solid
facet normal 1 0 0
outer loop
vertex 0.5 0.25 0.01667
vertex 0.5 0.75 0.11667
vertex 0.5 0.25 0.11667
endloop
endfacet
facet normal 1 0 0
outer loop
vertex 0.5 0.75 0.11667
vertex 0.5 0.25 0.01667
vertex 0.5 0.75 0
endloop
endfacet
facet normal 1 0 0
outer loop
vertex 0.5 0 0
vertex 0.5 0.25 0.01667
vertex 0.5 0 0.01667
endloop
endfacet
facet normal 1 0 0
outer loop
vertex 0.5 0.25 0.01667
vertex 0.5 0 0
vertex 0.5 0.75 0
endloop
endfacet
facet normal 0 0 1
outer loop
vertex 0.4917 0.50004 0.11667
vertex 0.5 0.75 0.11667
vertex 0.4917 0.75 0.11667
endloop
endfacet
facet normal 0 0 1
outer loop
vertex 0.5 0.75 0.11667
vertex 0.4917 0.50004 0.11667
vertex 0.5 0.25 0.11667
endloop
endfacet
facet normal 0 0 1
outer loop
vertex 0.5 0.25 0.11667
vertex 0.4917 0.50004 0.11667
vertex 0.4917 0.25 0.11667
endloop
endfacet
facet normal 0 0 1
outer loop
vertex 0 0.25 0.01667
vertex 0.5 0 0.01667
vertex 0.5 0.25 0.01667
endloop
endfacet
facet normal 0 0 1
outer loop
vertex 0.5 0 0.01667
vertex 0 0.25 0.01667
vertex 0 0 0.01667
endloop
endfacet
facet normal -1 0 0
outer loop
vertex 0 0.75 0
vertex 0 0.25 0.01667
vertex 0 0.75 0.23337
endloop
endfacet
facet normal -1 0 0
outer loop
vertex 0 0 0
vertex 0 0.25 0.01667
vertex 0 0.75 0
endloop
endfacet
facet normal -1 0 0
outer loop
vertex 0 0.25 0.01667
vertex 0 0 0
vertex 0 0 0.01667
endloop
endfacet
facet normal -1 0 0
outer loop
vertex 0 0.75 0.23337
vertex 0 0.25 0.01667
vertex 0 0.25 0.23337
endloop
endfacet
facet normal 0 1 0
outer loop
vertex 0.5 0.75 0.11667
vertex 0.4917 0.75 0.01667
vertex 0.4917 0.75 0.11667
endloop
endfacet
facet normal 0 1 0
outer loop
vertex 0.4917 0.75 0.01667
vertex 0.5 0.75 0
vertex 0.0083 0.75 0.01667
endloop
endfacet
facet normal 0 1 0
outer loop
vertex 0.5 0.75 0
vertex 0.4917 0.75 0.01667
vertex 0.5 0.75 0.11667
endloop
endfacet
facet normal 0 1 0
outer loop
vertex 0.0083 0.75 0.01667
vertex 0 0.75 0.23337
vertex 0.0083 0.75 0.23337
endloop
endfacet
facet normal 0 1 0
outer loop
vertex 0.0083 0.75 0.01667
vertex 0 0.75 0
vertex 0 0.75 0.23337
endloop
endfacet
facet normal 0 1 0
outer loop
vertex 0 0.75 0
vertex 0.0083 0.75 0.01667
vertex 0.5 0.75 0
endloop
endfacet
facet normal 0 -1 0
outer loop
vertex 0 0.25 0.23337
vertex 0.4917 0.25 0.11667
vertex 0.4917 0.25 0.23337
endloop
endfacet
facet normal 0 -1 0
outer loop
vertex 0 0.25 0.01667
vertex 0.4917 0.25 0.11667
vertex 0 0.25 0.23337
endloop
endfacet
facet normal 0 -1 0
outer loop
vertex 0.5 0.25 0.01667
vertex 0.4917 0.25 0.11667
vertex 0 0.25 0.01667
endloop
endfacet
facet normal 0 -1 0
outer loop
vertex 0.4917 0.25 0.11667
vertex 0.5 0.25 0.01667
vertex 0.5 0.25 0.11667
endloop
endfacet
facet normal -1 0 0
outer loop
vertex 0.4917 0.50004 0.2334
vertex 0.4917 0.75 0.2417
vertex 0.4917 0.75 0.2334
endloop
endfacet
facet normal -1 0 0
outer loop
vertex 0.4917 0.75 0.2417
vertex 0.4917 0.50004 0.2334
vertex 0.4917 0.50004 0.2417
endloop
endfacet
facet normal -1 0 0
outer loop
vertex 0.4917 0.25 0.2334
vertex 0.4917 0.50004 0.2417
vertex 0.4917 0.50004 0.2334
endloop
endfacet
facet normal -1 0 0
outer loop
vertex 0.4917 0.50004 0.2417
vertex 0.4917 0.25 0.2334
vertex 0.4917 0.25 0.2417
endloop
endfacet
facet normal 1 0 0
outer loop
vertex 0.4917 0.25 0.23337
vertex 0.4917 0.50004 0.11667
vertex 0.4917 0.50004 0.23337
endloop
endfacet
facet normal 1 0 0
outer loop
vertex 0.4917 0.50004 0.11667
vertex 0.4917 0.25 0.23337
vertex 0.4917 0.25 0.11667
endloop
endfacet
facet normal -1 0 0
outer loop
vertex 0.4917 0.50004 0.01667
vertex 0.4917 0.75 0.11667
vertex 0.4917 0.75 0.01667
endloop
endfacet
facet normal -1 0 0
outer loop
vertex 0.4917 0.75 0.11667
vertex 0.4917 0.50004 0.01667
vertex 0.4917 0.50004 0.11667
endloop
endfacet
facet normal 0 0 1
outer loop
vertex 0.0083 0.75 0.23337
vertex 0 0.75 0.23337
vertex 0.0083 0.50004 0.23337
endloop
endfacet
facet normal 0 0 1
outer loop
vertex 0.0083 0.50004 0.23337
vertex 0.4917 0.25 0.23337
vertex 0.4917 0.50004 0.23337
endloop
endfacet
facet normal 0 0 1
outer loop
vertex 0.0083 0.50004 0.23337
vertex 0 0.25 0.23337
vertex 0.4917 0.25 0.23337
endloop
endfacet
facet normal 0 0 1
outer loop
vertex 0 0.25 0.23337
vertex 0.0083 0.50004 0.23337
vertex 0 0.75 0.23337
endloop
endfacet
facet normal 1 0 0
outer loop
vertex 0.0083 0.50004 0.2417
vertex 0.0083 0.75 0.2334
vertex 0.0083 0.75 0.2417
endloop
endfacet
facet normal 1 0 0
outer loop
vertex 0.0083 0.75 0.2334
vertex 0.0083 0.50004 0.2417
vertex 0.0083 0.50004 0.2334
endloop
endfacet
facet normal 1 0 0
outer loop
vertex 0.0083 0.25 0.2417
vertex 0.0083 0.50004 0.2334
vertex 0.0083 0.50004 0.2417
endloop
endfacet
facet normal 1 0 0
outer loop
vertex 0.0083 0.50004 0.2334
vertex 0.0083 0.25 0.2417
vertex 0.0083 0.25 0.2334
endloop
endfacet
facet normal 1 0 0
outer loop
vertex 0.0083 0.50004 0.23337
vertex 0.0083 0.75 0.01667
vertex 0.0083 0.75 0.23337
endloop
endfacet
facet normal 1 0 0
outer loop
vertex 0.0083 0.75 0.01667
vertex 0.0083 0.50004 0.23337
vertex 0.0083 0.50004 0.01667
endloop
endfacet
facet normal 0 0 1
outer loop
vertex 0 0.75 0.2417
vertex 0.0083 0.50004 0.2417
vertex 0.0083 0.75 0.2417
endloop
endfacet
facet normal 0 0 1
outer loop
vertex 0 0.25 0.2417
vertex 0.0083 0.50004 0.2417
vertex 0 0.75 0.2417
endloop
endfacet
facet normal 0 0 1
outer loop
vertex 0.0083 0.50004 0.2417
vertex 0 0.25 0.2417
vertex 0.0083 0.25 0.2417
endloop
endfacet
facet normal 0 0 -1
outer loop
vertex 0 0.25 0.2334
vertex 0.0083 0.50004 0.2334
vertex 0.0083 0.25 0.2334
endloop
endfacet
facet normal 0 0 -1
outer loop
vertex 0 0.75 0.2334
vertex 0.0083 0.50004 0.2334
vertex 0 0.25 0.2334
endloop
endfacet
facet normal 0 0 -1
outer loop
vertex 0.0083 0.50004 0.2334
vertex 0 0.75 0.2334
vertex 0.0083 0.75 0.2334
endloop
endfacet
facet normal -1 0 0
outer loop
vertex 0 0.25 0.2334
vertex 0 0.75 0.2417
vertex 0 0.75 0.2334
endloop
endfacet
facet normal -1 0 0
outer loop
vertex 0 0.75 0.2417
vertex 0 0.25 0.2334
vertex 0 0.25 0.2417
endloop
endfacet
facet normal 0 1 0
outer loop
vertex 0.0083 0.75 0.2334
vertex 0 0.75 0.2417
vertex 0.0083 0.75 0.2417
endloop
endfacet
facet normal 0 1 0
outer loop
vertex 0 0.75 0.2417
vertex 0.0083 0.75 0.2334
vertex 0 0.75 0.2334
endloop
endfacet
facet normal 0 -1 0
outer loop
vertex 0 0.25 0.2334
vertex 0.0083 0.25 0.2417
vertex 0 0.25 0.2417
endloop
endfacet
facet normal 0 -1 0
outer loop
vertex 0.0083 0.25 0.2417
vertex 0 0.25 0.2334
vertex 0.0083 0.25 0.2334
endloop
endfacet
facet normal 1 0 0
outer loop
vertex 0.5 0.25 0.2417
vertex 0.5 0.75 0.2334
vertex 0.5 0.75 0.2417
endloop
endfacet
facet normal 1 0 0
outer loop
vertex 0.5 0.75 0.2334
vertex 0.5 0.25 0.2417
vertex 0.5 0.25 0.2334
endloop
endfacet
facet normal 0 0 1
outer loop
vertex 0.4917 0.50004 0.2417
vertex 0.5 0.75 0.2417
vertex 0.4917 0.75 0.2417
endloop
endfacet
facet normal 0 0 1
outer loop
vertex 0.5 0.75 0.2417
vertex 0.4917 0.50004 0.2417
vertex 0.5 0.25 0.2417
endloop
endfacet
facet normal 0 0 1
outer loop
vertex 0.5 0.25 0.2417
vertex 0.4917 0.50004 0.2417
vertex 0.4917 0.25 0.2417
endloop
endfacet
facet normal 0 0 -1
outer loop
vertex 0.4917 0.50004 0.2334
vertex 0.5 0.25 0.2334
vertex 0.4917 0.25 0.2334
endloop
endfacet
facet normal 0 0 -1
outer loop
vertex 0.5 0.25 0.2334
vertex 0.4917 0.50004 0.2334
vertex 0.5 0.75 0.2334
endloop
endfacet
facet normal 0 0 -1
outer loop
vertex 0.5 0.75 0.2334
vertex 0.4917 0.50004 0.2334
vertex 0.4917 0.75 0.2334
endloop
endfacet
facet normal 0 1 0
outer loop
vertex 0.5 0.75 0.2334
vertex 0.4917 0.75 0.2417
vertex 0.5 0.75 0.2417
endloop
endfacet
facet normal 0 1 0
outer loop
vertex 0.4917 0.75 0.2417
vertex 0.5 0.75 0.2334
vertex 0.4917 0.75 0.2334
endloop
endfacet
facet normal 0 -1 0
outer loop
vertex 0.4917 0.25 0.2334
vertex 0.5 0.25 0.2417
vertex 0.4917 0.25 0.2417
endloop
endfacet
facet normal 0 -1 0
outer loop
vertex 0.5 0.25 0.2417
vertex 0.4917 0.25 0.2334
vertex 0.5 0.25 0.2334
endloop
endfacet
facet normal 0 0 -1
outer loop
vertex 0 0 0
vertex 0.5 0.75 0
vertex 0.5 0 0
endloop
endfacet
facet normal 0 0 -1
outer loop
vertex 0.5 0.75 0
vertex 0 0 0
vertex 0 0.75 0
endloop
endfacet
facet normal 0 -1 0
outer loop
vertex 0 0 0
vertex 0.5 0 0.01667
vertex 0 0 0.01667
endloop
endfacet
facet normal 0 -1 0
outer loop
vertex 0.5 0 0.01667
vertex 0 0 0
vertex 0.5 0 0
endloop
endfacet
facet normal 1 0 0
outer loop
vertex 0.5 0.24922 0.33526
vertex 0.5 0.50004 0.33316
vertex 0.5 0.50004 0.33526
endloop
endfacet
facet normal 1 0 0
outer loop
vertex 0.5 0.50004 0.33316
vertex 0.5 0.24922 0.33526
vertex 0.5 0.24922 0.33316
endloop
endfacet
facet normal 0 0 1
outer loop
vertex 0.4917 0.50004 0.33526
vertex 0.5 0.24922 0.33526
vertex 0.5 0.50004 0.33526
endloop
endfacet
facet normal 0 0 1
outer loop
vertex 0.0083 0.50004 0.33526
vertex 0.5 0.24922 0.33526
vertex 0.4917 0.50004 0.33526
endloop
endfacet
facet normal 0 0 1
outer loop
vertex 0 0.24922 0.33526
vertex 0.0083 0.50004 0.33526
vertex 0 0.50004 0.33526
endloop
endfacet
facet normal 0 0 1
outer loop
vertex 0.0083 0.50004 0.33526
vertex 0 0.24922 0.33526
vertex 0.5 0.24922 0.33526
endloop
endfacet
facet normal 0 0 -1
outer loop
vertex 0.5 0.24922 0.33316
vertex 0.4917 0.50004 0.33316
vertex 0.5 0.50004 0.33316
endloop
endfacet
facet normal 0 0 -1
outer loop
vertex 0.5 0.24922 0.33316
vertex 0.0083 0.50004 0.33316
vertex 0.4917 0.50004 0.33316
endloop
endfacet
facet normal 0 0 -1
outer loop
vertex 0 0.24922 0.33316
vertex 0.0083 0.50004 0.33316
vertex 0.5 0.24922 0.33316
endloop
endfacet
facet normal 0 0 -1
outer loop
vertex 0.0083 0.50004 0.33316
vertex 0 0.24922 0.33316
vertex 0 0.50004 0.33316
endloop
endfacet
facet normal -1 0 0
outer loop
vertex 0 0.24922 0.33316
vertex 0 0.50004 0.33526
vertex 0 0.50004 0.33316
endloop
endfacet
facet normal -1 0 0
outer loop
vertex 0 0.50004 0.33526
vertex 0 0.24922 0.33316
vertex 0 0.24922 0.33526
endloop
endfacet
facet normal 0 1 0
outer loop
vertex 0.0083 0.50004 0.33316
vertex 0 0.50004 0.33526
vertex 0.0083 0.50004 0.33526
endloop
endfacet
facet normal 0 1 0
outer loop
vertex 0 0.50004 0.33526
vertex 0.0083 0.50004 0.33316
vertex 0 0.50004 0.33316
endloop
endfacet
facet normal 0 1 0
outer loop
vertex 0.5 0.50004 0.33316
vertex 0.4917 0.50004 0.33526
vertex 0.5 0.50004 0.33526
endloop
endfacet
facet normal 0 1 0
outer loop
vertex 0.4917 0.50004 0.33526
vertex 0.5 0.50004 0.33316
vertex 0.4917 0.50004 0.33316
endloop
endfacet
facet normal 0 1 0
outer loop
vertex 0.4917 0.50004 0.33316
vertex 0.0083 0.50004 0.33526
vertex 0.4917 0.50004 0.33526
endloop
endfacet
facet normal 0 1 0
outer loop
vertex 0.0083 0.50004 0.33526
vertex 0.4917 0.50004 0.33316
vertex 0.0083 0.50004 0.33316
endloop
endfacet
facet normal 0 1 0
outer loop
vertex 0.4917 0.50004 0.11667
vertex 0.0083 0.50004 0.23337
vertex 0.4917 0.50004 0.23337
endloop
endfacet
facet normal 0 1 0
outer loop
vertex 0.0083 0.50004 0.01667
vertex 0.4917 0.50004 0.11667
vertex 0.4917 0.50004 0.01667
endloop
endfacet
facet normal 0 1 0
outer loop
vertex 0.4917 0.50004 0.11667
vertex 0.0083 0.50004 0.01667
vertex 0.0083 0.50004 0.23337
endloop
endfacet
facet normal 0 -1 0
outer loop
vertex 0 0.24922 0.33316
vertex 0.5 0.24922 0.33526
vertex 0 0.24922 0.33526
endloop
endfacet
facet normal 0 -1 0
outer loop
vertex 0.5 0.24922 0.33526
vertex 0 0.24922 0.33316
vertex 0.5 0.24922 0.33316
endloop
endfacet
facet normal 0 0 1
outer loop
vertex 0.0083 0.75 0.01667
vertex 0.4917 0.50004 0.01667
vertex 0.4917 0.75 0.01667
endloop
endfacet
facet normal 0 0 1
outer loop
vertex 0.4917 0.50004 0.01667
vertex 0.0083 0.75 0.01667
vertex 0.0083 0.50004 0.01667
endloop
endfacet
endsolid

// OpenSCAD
// ============================================================
// Parameters
// ============================================================

// Base slab
base_length = 0.5;
base_width = 0.75;
base_height = 0.016667;
base_extrusion = 0.0167;

// Upper rectangular feature
feat_x = 0.5;
feat_y = 0.5;
feat_y_offset = 0.25;
feat_reach = 0.2334;

// Stepped portion: upper pad and deeper continuation
upper_pad_depth = 0.1;
deeper_cont_depth = 0.2167;
// Deeper continuation shares left/front/back edges; right edge inset
deeper_x_right = 0.4917;

// Edge strips
strip_w = 0.0083;
strip_l = 0.5;
strip_h = 0.0083;

// Transverse feature
trans_x = 0.5;
trans_y = 0.250819;
trans_y_offset = 0.24922;
trans_thickness = 0.0021;
trans_reach = 0.335265;

// Interior void (closed internal profile between strips and transverse)
void_x_min = strip_w;
void_x_max = base_length - strip_w;
void_y_min = trans_y_offset + trans_y;
void_y_max = base_width;

$fn = 100;

// ============================================================
// Modules
// ============================================================

// Base slab
module base_slab() {
    cube([base_length, base_width, base_height]);
}

// Stepped rectangular feature combining upper pad and deeper continuation
module stepped_feature() {
    shoulder_z = base_height;

    // Upper pad: wider, shallower step (depth 0.1 from shoulder)
    translate([0, feat_y_offset, shoulder_z])
        cube([feat_x, feat_y, upper_pad_depth]);

    // Deeper continuation: narrower, taller (depth 0.2167 from same shoulder)
    // Shares left, front, and back edges with upper pad; right edge at 0.4917
    translate([0, feat_y_offset, shoulder_z])
        cube([deeper_x_right, feat_y, deeper_cont_depth]);
}

// Two narrow edge strips along left and right edges of the rear region
module edge_strips() {
    strip_z = feat_reach; // Bottom of strips at top of feature

    // Left strip: flush with left edge, offset 0.4917 from right
    translate([0, feat_y_offset, strip_z])
        cube([strip_w, strip_l, strip_h]);

    // Right strip: flush with right edge, offset 0.4917 from left
    translate([base_length - strip_w, feat_y_offset, strip_z])
        cube([strip_w, strip_l, strip_h]);
}

// Thin transverse feature spanning full width
module transverse_feature() {
    trans_z_bottom = trans_reach - trans_thickness;
    translate([0, trans_y_offset, trans_z_bottom])
        cube([trans_x, trans_y, trans_thickness]);
}

// Open void through the added material preserving the closed internal profile
module interior_void() {
    // Void region bounded by strips (left/right), transverse (front), back edge
    // Extends from top of slab upward through all added material
    void_height = trans_reach; // Sufficient to clear all features
    translate([void_x_min, void_y_min, base_height])
        cube([void_x_max - void_x_min, void_y_max - void_y_min, void_height]);
}

// ============================================================
// Assembly: union of all solids minus interior void
// ============================================================

difference() {
    union() {
        base_slab();
        stepped_feature();
        edge_strips();
        transverse_feature();
    }
    interior_void();
}
